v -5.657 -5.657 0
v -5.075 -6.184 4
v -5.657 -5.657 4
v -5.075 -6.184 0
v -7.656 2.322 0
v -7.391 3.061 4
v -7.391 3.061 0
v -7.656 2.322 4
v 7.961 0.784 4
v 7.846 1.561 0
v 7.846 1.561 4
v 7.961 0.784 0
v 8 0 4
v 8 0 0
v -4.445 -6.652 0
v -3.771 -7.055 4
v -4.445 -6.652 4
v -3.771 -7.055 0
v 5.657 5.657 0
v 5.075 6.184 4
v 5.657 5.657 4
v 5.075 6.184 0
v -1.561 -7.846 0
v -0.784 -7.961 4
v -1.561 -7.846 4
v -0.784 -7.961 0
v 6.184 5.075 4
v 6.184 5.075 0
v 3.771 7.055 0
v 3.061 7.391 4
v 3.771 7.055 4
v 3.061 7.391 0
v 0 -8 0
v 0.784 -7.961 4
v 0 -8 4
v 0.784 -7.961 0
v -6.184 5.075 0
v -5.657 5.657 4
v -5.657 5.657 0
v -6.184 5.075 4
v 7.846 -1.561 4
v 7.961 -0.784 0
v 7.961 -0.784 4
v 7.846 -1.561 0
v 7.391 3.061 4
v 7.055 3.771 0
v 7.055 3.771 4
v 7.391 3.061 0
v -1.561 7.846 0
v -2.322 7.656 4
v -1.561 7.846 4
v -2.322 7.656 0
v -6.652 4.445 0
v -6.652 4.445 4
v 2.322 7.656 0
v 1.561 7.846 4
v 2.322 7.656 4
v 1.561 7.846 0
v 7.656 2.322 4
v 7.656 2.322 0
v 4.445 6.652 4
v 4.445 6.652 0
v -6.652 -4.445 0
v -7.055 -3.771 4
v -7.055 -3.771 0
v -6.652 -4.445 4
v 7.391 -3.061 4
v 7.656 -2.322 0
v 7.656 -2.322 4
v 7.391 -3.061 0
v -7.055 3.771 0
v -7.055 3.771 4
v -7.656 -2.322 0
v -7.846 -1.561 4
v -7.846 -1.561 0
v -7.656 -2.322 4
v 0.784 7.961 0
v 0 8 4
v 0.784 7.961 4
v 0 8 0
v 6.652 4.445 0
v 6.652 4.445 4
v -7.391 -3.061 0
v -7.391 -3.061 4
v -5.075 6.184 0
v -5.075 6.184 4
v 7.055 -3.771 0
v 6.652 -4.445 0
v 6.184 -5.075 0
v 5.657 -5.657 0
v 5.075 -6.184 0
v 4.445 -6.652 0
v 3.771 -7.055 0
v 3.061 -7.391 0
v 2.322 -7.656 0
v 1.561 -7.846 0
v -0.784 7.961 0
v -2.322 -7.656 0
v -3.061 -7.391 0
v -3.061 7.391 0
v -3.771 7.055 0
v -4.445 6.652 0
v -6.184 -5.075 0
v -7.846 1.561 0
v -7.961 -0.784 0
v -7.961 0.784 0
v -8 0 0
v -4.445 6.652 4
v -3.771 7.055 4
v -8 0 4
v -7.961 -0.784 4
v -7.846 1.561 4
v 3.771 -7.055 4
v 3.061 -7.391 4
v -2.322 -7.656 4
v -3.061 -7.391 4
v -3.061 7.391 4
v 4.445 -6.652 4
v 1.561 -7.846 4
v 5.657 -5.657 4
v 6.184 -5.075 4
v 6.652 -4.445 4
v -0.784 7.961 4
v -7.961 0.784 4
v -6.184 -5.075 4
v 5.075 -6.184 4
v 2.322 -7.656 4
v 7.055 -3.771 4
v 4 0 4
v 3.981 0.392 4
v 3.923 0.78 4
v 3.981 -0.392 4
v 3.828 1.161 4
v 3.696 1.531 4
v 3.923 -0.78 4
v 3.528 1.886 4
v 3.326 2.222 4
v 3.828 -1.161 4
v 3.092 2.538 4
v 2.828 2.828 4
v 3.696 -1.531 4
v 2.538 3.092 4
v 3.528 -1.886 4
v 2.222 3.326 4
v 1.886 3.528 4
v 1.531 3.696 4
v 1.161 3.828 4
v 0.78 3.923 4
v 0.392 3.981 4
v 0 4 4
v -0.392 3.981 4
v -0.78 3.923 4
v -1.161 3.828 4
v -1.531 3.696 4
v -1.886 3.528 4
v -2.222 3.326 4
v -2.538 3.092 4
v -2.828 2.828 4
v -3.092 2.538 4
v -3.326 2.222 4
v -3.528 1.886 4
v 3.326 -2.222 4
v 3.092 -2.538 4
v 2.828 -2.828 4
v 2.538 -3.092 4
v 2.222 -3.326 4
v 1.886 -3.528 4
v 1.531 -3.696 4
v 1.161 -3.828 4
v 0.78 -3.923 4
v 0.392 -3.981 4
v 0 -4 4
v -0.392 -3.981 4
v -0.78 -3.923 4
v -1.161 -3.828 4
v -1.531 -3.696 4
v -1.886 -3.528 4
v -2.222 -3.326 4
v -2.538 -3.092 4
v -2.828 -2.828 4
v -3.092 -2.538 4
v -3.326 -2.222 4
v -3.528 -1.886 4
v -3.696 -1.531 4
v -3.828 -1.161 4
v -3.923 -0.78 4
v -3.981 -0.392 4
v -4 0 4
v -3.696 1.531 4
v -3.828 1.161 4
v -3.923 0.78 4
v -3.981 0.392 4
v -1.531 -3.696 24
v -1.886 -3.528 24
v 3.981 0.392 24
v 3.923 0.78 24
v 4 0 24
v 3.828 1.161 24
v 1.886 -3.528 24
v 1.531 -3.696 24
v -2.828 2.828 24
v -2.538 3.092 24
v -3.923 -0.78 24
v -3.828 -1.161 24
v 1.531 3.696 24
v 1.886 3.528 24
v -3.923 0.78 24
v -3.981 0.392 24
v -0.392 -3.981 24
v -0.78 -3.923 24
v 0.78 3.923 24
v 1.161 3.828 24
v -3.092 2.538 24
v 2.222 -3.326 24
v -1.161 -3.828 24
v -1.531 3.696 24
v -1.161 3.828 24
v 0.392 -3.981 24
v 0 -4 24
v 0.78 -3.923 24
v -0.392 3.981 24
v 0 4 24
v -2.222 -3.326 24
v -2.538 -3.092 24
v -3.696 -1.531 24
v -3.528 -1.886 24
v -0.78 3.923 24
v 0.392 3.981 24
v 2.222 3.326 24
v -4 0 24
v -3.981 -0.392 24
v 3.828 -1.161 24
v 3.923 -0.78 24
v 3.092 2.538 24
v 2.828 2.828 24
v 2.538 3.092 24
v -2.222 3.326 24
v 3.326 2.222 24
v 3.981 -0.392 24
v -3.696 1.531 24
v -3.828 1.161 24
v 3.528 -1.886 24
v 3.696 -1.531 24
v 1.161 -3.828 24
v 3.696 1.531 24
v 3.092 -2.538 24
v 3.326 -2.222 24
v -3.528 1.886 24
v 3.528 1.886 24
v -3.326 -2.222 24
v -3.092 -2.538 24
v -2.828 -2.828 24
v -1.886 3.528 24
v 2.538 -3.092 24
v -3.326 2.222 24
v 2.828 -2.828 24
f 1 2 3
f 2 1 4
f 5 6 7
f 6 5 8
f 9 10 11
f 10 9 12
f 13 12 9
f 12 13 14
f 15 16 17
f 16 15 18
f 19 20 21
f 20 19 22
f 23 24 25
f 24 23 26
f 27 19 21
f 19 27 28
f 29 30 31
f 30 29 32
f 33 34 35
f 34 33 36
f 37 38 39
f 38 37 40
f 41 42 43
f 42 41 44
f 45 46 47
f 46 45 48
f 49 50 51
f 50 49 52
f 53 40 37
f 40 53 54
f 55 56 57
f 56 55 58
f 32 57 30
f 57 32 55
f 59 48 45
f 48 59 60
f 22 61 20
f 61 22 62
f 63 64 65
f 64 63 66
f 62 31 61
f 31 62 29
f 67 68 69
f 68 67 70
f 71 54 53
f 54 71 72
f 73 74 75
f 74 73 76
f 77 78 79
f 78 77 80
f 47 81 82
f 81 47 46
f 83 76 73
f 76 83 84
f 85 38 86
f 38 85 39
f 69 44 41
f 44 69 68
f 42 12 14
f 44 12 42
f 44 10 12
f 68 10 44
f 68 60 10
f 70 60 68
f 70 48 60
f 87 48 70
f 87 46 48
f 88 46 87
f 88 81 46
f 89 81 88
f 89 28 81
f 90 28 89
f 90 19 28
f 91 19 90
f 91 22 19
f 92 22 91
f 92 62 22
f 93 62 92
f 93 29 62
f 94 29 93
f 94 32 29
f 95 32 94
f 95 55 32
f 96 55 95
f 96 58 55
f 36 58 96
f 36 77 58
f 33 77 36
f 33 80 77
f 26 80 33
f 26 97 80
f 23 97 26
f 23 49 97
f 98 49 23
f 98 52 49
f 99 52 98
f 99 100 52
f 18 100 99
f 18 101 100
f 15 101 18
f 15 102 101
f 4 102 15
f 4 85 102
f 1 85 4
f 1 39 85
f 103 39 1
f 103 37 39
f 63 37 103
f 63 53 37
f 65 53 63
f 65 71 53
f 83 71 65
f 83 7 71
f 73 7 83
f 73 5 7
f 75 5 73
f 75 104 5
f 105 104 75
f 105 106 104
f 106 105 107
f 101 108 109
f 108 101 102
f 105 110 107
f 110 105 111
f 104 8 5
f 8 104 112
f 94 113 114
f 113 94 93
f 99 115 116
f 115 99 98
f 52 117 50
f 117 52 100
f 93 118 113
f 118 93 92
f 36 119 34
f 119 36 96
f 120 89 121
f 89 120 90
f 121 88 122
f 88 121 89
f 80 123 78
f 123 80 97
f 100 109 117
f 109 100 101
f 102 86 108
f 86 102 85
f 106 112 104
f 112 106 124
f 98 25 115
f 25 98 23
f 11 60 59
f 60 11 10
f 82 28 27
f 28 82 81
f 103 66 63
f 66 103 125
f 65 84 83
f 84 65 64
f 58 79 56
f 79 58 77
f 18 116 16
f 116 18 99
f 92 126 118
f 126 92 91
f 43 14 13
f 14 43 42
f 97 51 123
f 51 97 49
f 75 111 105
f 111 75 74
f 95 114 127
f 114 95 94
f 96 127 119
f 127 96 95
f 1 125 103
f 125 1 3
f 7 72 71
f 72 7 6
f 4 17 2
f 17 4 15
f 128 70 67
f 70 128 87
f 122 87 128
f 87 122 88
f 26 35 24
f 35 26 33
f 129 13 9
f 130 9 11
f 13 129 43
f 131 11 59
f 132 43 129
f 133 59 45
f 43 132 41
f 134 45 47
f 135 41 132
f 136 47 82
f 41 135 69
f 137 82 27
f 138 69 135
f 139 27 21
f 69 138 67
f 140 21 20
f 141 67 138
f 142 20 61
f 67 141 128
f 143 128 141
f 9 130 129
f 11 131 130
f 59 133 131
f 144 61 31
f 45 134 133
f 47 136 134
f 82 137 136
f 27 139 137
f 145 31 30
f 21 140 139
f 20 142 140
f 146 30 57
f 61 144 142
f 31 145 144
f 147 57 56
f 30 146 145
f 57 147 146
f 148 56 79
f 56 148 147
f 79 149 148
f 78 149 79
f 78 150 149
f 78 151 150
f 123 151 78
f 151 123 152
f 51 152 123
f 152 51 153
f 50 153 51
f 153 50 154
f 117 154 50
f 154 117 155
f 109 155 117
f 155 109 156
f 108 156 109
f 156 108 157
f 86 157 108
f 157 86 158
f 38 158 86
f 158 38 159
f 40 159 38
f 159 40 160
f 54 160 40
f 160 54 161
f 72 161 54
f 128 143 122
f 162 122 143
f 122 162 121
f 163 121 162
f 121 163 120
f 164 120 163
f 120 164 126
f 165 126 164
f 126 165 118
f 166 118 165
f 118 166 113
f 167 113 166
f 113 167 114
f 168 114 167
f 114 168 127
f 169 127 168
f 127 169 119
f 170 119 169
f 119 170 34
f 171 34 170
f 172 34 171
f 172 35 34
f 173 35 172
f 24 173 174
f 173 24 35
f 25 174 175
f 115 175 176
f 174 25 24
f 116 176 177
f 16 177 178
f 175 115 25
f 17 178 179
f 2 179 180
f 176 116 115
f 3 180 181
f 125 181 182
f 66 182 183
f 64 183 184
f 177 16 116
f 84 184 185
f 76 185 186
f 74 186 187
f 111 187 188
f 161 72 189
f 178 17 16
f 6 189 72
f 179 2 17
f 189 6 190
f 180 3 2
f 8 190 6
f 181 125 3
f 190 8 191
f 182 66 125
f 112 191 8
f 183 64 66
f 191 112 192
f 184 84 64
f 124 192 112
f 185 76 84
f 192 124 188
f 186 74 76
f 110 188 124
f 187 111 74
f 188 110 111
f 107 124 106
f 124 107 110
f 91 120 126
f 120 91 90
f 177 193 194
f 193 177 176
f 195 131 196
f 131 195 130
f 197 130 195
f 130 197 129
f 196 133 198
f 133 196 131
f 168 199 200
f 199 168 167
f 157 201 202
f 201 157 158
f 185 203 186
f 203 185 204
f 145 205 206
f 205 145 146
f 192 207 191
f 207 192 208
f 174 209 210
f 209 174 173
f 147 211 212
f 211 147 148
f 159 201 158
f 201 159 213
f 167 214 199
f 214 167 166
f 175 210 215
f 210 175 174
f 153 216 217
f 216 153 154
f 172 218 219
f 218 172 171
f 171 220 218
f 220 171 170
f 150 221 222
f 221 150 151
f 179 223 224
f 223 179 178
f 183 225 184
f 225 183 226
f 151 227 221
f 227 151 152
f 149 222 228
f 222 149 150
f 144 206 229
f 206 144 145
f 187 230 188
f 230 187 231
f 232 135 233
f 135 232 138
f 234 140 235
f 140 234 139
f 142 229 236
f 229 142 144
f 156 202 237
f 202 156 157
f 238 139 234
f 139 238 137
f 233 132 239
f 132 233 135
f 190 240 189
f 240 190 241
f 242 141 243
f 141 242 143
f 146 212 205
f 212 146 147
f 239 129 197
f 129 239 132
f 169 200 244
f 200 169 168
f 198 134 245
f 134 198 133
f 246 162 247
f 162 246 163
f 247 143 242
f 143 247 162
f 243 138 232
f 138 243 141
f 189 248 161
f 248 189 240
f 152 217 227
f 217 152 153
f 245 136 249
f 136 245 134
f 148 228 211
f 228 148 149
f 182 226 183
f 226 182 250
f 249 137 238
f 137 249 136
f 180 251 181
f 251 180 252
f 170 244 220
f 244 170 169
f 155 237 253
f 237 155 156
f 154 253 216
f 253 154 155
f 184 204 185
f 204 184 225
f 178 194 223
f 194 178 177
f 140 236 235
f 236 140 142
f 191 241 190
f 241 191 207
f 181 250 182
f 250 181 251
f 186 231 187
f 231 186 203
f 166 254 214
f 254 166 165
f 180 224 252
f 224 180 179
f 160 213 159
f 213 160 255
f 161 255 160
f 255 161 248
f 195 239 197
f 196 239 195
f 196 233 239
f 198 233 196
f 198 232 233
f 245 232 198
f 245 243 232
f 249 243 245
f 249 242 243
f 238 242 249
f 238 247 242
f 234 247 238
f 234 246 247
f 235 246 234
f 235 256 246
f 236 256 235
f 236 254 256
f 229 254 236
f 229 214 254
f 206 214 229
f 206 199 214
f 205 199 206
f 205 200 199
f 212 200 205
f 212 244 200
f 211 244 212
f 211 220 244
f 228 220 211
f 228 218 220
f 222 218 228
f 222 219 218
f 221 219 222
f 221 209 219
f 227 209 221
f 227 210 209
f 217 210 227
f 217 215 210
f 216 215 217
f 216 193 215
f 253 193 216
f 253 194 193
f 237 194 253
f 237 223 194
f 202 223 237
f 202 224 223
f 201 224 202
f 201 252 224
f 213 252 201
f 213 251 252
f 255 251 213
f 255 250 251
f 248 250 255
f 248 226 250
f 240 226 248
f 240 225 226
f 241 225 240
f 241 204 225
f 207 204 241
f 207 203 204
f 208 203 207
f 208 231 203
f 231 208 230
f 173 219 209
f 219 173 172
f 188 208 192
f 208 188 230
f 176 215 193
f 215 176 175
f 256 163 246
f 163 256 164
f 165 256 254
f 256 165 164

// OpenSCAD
// Dowel peg - a peg on a shoulder, for alignment or shelf support. NOVEL general part.
//
// @desc dowel peg with a shoulder
// @prompt Design a dowel peg in OpenSCAD: a {peg_d} mm diameter peg {peg_l} mm long standing on a {base_d} mm shoulder {base_h} mm thick. Reply with a single complete OpenSCAD file.
// @param peg_d  peg diameter, mm        [4:20]
// @param peg_l  peg length, mm          [8:40]
// @param base_d shoulder diameter, mm   [10:40]
// @param base_h shoulder thickness, mm  [2:8]

peg_d  = 8;
peg_l  = 20;
base_d = 16;
base_h = 4;

$fn = 64;

union() {
    cylinder(h = base_h, d = base_d);
    translate([0, 0, base_h]) cylinder(h = peg_l, d = peg_d);
}
